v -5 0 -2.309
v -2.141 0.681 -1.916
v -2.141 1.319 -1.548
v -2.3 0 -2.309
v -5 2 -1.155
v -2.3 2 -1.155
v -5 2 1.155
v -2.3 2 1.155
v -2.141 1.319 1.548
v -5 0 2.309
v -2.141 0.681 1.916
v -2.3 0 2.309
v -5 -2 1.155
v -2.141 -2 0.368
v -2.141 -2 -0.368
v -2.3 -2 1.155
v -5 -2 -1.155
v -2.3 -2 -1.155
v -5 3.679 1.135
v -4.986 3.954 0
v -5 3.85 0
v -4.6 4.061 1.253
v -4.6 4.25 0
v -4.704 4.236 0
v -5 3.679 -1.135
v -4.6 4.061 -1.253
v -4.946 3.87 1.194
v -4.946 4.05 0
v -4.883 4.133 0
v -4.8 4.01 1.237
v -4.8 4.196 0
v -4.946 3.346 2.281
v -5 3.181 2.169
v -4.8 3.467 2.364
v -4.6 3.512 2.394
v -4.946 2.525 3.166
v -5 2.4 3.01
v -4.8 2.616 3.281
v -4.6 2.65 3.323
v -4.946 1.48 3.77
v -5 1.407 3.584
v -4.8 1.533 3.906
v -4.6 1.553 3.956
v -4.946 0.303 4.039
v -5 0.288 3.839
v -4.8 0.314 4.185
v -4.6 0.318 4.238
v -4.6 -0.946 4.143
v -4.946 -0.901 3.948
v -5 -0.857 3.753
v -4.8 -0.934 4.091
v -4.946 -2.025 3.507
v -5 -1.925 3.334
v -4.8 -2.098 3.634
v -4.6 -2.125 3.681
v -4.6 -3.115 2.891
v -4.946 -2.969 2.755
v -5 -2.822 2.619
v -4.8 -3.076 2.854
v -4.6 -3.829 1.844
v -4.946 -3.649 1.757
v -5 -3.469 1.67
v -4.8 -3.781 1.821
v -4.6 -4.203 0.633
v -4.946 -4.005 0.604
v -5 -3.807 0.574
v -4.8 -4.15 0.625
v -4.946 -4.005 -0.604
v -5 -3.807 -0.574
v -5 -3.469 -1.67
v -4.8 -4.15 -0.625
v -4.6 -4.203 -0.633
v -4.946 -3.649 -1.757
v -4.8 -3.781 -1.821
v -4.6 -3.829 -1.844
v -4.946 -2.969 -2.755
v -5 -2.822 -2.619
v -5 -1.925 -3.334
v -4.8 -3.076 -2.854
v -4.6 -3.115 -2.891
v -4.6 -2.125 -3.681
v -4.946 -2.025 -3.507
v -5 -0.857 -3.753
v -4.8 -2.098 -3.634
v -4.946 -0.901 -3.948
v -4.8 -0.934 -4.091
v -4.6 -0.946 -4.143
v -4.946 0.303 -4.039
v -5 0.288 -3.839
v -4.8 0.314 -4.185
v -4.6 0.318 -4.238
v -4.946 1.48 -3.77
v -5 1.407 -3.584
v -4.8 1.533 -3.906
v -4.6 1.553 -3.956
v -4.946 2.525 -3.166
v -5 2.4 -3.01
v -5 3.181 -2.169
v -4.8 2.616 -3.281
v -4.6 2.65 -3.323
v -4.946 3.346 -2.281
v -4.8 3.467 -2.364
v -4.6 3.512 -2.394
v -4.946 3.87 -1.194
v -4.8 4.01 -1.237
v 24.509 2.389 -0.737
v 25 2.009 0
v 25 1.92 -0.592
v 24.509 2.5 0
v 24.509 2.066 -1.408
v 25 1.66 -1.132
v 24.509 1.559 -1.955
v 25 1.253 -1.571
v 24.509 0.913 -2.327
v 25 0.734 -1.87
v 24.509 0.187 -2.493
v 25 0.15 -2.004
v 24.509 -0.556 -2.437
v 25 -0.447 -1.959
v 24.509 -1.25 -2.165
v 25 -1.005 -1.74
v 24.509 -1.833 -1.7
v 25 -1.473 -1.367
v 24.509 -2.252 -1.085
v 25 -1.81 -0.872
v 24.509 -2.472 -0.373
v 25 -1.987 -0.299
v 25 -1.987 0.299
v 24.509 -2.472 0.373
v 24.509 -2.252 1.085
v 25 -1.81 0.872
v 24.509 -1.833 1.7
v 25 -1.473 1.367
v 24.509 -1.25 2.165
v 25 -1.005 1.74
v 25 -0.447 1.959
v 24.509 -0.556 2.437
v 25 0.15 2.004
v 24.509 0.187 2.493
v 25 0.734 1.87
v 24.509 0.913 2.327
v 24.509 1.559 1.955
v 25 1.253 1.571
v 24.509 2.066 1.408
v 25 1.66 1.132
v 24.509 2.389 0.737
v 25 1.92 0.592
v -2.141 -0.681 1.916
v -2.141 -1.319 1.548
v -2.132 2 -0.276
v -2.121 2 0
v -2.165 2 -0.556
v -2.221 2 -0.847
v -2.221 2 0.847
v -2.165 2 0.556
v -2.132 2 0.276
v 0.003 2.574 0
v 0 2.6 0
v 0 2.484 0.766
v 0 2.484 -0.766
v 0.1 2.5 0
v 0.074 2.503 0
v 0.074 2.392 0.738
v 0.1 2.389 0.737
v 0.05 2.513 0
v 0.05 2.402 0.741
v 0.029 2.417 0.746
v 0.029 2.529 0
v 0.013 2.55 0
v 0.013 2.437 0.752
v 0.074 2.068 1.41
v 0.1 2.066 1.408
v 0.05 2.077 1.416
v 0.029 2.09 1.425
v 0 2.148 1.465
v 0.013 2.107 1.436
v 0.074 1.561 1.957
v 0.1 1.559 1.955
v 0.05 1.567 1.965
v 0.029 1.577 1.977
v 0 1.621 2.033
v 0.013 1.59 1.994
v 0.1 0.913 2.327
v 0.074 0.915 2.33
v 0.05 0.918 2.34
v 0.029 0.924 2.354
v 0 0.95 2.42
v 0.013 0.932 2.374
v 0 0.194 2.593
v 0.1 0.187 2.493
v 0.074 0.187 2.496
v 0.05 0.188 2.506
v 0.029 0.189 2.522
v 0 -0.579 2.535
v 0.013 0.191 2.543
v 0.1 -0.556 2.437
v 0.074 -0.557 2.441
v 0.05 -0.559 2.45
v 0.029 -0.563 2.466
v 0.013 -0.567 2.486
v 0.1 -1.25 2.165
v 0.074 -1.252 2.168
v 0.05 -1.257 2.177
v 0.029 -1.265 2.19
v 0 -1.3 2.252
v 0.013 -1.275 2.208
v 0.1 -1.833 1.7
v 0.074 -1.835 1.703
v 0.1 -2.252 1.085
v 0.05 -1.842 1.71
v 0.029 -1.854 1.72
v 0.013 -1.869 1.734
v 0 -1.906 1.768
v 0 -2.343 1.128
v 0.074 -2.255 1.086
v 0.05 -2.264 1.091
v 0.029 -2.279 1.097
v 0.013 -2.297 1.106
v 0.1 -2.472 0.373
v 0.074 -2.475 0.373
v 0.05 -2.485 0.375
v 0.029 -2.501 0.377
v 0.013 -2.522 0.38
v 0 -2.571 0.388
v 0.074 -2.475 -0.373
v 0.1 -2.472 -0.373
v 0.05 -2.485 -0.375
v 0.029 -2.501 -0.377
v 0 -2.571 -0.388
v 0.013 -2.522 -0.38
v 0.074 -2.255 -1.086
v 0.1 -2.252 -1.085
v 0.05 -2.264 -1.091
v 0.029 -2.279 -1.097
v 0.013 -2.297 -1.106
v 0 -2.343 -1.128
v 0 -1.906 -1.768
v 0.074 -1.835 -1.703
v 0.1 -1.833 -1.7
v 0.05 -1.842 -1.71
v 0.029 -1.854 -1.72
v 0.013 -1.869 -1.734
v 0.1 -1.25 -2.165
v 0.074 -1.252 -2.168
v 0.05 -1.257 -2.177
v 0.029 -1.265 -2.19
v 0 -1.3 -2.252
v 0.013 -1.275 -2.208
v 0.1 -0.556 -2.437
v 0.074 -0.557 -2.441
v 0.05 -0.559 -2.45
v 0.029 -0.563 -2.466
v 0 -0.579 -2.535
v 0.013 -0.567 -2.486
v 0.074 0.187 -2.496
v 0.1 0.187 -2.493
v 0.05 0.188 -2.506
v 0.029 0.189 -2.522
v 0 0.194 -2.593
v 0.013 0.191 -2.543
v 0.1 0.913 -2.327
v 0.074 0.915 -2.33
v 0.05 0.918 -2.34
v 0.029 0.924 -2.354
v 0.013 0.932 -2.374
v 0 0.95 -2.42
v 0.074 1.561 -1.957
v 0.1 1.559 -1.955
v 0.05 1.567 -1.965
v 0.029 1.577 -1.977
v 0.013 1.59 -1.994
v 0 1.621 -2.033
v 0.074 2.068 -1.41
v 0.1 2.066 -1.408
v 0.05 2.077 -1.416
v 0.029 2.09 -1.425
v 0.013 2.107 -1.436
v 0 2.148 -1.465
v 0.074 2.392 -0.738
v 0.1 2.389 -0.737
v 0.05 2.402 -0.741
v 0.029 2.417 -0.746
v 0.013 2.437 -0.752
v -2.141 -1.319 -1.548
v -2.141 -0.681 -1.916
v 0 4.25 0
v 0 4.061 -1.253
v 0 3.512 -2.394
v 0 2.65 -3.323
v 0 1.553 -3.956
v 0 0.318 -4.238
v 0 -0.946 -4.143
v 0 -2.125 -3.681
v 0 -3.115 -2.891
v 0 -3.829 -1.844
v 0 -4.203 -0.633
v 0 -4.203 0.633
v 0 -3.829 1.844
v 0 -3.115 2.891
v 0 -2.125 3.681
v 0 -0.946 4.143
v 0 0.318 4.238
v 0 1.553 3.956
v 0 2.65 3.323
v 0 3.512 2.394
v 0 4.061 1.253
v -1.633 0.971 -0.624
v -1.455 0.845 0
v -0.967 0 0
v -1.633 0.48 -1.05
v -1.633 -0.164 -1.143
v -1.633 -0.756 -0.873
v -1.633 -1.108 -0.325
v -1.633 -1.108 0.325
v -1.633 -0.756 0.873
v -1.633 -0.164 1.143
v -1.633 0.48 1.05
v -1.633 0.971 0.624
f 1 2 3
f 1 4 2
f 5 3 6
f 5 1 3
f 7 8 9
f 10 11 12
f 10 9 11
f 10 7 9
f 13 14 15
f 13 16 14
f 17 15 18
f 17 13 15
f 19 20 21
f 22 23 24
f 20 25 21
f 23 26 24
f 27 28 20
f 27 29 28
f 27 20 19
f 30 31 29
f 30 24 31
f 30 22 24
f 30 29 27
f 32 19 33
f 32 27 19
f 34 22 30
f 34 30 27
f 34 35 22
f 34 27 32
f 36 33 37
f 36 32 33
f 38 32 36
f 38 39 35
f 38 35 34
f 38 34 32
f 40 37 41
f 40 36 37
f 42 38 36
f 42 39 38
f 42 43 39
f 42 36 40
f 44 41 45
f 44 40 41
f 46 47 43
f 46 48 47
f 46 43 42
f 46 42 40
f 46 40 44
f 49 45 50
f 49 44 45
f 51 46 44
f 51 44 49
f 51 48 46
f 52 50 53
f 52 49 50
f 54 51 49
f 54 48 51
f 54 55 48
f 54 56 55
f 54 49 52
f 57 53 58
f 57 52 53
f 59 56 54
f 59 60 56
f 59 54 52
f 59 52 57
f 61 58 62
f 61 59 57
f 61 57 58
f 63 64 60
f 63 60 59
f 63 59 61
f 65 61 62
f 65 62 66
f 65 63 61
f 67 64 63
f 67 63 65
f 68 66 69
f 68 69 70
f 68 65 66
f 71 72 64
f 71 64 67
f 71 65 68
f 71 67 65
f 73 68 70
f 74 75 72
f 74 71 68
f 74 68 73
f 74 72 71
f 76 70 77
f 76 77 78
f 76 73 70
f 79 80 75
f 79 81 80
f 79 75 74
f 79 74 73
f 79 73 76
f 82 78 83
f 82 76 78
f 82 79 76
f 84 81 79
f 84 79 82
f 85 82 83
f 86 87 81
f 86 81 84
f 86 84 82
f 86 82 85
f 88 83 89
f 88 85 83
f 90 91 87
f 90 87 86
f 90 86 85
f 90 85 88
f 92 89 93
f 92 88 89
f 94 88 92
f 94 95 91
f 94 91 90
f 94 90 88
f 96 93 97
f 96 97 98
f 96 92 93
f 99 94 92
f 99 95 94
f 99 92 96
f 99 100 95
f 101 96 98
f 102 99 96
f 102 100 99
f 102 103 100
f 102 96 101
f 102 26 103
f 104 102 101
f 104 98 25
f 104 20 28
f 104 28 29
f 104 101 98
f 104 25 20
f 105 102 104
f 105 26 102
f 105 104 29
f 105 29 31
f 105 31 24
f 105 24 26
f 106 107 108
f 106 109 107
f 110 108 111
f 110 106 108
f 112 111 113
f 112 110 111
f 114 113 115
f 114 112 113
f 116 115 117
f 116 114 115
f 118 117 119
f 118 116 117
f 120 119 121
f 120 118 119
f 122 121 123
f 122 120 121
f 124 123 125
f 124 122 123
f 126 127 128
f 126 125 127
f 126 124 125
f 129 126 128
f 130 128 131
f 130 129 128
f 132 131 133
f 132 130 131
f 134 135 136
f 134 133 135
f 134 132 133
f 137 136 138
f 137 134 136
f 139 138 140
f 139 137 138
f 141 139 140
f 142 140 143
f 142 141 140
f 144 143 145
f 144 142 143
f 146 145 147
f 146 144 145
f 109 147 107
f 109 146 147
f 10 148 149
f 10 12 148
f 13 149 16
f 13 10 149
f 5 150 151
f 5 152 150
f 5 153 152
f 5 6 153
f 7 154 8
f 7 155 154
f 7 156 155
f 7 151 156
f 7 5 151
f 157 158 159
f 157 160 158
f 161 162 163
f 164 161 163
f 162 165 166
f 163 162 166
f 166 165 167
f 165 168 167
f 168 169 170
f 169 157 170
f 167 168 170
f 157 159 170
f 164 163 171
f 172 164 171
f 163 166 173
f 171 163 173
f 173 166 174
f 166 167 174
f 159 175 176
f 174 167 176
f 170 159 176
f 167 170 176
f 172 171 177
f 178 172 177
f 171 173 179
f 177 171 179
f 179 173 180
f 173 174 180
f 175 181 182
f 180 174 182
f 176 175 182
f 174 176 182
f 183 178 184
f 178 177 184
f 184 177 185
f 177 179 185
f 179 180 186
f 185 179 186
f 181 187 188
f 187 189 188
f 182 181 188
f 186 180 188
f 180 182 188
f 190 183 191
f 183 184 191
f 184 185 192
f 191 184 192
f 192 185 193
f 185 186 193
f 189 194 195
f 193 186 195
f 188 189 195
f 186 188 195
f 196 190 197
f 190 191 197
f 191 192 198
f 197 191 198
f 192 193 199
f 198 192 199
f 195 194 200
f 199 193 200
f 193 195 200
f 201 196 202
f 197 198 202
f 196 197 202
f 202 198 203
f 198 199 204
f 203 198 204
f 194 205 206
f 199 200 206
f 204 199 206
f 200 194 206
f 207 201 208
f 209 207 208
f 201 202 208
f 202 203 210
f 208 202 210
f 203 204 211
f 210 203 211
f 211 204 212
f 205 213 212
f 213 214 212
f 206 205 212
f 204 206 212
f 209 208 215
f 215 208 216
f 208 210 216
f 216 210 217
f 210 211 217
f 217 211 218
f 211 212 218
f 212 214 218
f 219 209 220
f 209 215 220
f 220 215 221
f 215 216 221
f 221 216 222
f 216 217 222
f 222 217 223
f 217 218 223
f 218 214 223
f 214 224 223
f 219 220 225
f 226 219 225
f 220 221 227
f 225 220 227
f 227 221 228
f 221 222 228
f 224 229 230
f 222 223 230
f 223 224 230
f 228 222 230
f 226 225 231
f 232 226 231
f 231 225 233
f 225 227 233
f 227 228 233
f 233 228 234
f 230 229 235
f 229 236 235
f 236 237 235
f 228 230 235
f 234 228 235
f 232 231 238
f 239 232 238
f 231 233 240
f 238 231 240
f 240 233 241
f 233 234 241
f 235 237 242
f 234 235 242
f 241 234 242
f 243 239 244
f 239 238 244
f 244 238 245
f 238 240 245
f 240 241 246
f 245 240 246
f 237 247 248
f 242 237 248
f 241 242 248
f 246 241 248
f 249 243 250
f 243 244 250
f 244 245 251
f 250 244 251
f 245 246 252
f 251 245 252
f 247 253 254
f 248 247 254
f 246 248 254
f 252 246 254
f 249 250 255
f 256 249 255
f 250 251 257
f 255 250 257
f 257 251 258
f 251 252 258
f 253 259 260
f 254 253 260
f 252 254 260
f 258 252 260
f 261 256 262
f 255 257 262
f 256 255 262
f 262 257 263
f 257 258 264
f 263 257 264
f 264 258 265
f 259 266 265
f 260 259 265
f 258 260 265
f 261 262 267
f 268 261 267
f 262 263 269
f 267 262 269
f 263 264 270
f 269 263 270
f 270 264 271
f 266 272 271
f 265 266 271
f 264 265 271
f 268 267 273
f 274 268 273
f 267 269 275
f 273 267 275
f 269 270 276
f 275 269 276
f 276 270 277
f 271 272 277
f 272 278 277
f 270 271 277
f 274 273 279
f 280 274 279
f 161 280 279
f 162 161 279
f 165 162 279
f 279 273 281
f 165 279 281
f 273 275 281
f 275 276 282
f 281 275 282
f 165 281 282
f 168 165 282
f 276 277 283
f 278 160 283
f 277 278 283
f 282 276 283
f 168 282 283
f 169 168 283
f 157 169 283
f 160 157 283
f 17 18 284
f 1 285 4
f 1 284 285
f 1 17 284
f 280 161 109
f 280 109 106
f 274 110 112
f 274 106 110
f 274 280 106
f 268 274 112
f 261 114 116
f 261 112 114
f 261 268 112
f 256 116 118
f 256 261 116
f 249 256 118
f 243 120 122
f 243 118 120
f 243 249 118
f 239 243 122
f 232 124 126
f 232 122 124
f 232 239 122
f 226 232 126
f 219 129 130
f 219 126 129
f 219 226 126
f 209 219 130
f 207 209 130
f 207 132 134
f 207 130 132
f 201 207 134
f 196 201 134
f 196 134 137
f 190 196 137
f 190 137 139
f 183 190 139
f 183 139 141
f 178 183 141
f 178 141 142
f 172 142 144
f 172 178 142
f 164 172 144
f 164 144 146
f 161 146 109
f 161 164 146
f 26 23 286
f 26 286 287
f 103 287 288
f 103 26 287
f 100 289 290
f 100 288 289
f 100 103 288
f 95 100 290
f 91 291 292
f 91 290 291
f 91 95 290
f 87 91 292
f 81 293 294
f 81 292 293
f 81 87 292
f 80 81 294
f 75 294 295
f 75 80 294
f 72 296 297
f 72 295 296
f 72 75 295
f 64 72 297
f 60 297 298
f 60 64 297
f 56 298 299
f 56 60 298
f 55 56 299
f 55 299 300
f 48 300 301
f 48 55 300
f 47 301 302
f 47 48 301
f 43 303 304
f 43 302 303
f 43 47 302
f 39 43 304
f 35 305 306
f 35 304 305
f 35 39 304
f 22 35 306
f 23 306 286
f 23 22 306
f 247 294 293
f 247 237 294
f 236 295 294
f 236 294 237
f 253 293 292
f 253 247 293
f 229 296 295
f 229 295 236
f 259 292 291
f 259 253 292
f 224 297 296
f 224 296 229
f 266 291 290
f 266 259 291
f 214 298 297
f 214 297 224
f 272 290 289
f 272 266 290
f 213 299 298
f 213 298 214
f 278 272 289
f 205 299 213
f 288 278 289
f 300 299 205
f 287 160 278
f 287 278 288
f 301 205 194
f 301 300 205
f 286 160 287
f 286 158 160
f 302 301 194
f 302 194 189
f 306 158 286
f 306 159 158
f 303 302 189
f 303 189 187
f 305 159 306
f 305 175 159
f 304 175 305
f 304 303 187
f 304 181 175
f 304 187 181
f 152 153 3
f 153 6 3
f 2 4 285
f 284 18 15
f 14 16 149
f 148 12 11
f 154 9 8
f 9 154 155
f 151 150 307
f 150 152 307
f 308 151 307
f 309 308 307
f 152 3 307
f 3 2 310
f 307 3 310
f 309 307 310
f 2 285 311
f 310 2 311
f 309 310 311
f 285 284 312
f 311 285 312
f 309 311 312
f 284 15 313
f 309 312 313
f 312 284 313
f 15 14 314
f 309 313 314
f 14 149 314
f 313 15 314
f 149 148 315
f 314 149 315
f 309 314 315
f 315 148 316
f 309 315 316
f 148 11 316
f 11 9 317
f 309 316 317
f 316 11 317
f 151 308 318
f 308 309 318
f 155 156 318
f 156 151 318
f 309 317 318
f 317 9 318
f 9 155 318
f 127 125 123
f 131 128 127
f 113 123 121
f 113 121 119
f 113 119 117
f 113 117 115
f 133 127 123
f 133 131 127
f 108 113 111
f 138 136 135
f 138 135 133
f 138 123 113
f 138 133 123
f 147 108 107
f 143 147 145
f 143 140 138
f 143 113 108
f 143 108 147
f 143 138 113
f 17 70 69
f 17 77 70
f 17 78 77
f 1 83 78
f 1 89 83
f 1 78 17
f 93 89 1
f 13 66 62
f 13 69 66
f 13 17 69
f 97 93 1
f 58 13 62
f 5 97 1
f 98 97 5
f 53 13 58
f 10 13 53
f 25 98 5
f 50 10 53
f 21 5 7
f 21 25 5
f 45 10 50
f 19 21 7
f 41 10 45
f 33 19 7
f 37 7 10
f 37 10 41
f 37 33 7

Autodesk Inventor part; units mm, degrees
ref_plane "YZ Plane" through (0, 0, 0) normal (1, 0, 0) x (0, 1, 0)
ref_plane "XZ Plane" through (0, 0, 0) normal (0, 1, 0) x (-1, 0, 0)
sketch "Sketch1" plane through (0, 0, 0) normal (0, 0, 1) x (1, 0, 0)
  line L0 (-0.9667, 0) -> (25, 0)
  line L1 (25, 0) -> (25, 2.5)
  line L2 (25, 2.5) -> (9, 2.5)
  line L3 (9, 2.5) -> (8.5091, 2.5)
  line L4 (8.5091, 2.5) -> (0, 2.5)
  line L5 (0, 2.5) -> (0, 4.25)
  line L6 (0, 4.25) -> (-5, 4.25)
  line L7 (-5, 4.25) -> (-5, 2.3094)
  line L8 (-5, 2.3094) -> (-2.3, 2.3094)
  line L9 (-2.3, 2.3094) -> (-0.9667, 0)
  line L10 (-11, 0) -> (31, 0) projected
  line L11 (0, -0.85) -> (0, 5.1) projected
  line L12 (9, 2.5) -> (0, 2.5) construction
  dimension "d1" = 16
  dimension "d2" = 0.4909
  dimension "d3" = 5
  dimension "d4" = 2.7
  dimension "d5" = 60
  dimension "d6" = 5
  dimension "d7" = 5
  dimension "d8" = 4.6188
  dimension "d9" = 8.5
  dimension "d26" = 25
revolve "Body" add sketch "Sketch1" angle 360 about axis through (-0.9667, 0, 0) along (1, 0, 0)
sketch "Sketch2" plane through (-5, 0, 0) normal (-1, 0, 0) x (0, 0, 1)
  circle A0 centre (0, 0) radius 2.3094 projected
  line L0 (0, -5.95) -> (0, 5.95) projected
  line L1 (-5.95, 0) -> (5.95, 0) projected
  line L2 (2.3094, 0) -> (1.1547, -2)
  line L3 (1.1547, -2) -> (-1.1547, -2)
  line L4 (-1.1547, -2) -> (-2.3094, 0)
  line L5 (-2.3094, 0) -> (-1.1547, 2)
  line L6 (-1.1547, 2) -> (1.1547, 2)
  line L7 (1.1547, 2) -> (2.3094, 0)
extrude "Slot" add sketch "Sketch2" against normal up to next contours L7 A0 | A0 L2 | L6 L0 A0 | A0 L0 L3 | L0 L6 A0 | A0 L3 L0 | L4 A0 | A0 L5
fillet "Fillet1" radius 0.4 1 edges at (-5, -4.25, 0)
thread "Thread" size "M5x0.8" class "6g" standard "ISO Metric profile" length 16
chamfer "Chamfer1" distance 0.4908 distance2 0.4908 1 edges at (25, -2.5, 0) measured on face at (25, 0.6587, -0.3326)
ref_plane "Work Plane1" through (29, 0, 0) normal (0, -1, 0) x (1, 0, 0)
fillet "Fillet2" radius 0.1 1 edges at (0, -2.5, 0)
equation "\"d30\" = R"
equation "\"d17\" = RR"
equation "\"d13\" = GEL"
equation "\"d15\" = -0.5 * SPD + 0.5 * GD"
equation "\"d16\" = GUL"
equation "\"d1\" = GEL"
equation "\"d3\" = KOH"
equation "\"d4\" = INTI"
equation "\"d6\" = GD"
equation "\"d7\" = BDM"
equation "\"d8\" = 1.1547 * SW"
equation "\"d9\" = KOD"
equation "\"d26\" = NLG"
equation "\"GD\" = NND"
equation "\"NLG\" = 25"
equation "\"GEL\" = 16"
equation "\"KOD\" = 8.5"
equation "\"KOH\" = NND"
equation "\"INTI\" = 2.7"
equation "\"GAL\" = 0.61345 * PTC"
equation "\"GUL\" = 0.61345 * PTC"
equation "\"BDM\" = NND"
equation "\"SW\" = 4"
equation "\"RR\" = 0.4"
equation "\"SPD\" = NND - 1.2269 * PTC"
equation "\"R\" = 0.1"
equation "\"TOA\" = 30deg"
equation "\"GD1\" = THREADDIA - 1.2269 * PTC"
equation "\"THREADDIA\" = 5"
equation "\"FAWI\" = 45deg"
equation "\"PTC\" = 0.8"
equation "\"NND\" = 5"
equation "\"E0\" = 1.155 * SW"
equation "\"PHH\" = 0"
properties part number "CSN 02 1143 - M5 x 25" material "Steel, Mild"
